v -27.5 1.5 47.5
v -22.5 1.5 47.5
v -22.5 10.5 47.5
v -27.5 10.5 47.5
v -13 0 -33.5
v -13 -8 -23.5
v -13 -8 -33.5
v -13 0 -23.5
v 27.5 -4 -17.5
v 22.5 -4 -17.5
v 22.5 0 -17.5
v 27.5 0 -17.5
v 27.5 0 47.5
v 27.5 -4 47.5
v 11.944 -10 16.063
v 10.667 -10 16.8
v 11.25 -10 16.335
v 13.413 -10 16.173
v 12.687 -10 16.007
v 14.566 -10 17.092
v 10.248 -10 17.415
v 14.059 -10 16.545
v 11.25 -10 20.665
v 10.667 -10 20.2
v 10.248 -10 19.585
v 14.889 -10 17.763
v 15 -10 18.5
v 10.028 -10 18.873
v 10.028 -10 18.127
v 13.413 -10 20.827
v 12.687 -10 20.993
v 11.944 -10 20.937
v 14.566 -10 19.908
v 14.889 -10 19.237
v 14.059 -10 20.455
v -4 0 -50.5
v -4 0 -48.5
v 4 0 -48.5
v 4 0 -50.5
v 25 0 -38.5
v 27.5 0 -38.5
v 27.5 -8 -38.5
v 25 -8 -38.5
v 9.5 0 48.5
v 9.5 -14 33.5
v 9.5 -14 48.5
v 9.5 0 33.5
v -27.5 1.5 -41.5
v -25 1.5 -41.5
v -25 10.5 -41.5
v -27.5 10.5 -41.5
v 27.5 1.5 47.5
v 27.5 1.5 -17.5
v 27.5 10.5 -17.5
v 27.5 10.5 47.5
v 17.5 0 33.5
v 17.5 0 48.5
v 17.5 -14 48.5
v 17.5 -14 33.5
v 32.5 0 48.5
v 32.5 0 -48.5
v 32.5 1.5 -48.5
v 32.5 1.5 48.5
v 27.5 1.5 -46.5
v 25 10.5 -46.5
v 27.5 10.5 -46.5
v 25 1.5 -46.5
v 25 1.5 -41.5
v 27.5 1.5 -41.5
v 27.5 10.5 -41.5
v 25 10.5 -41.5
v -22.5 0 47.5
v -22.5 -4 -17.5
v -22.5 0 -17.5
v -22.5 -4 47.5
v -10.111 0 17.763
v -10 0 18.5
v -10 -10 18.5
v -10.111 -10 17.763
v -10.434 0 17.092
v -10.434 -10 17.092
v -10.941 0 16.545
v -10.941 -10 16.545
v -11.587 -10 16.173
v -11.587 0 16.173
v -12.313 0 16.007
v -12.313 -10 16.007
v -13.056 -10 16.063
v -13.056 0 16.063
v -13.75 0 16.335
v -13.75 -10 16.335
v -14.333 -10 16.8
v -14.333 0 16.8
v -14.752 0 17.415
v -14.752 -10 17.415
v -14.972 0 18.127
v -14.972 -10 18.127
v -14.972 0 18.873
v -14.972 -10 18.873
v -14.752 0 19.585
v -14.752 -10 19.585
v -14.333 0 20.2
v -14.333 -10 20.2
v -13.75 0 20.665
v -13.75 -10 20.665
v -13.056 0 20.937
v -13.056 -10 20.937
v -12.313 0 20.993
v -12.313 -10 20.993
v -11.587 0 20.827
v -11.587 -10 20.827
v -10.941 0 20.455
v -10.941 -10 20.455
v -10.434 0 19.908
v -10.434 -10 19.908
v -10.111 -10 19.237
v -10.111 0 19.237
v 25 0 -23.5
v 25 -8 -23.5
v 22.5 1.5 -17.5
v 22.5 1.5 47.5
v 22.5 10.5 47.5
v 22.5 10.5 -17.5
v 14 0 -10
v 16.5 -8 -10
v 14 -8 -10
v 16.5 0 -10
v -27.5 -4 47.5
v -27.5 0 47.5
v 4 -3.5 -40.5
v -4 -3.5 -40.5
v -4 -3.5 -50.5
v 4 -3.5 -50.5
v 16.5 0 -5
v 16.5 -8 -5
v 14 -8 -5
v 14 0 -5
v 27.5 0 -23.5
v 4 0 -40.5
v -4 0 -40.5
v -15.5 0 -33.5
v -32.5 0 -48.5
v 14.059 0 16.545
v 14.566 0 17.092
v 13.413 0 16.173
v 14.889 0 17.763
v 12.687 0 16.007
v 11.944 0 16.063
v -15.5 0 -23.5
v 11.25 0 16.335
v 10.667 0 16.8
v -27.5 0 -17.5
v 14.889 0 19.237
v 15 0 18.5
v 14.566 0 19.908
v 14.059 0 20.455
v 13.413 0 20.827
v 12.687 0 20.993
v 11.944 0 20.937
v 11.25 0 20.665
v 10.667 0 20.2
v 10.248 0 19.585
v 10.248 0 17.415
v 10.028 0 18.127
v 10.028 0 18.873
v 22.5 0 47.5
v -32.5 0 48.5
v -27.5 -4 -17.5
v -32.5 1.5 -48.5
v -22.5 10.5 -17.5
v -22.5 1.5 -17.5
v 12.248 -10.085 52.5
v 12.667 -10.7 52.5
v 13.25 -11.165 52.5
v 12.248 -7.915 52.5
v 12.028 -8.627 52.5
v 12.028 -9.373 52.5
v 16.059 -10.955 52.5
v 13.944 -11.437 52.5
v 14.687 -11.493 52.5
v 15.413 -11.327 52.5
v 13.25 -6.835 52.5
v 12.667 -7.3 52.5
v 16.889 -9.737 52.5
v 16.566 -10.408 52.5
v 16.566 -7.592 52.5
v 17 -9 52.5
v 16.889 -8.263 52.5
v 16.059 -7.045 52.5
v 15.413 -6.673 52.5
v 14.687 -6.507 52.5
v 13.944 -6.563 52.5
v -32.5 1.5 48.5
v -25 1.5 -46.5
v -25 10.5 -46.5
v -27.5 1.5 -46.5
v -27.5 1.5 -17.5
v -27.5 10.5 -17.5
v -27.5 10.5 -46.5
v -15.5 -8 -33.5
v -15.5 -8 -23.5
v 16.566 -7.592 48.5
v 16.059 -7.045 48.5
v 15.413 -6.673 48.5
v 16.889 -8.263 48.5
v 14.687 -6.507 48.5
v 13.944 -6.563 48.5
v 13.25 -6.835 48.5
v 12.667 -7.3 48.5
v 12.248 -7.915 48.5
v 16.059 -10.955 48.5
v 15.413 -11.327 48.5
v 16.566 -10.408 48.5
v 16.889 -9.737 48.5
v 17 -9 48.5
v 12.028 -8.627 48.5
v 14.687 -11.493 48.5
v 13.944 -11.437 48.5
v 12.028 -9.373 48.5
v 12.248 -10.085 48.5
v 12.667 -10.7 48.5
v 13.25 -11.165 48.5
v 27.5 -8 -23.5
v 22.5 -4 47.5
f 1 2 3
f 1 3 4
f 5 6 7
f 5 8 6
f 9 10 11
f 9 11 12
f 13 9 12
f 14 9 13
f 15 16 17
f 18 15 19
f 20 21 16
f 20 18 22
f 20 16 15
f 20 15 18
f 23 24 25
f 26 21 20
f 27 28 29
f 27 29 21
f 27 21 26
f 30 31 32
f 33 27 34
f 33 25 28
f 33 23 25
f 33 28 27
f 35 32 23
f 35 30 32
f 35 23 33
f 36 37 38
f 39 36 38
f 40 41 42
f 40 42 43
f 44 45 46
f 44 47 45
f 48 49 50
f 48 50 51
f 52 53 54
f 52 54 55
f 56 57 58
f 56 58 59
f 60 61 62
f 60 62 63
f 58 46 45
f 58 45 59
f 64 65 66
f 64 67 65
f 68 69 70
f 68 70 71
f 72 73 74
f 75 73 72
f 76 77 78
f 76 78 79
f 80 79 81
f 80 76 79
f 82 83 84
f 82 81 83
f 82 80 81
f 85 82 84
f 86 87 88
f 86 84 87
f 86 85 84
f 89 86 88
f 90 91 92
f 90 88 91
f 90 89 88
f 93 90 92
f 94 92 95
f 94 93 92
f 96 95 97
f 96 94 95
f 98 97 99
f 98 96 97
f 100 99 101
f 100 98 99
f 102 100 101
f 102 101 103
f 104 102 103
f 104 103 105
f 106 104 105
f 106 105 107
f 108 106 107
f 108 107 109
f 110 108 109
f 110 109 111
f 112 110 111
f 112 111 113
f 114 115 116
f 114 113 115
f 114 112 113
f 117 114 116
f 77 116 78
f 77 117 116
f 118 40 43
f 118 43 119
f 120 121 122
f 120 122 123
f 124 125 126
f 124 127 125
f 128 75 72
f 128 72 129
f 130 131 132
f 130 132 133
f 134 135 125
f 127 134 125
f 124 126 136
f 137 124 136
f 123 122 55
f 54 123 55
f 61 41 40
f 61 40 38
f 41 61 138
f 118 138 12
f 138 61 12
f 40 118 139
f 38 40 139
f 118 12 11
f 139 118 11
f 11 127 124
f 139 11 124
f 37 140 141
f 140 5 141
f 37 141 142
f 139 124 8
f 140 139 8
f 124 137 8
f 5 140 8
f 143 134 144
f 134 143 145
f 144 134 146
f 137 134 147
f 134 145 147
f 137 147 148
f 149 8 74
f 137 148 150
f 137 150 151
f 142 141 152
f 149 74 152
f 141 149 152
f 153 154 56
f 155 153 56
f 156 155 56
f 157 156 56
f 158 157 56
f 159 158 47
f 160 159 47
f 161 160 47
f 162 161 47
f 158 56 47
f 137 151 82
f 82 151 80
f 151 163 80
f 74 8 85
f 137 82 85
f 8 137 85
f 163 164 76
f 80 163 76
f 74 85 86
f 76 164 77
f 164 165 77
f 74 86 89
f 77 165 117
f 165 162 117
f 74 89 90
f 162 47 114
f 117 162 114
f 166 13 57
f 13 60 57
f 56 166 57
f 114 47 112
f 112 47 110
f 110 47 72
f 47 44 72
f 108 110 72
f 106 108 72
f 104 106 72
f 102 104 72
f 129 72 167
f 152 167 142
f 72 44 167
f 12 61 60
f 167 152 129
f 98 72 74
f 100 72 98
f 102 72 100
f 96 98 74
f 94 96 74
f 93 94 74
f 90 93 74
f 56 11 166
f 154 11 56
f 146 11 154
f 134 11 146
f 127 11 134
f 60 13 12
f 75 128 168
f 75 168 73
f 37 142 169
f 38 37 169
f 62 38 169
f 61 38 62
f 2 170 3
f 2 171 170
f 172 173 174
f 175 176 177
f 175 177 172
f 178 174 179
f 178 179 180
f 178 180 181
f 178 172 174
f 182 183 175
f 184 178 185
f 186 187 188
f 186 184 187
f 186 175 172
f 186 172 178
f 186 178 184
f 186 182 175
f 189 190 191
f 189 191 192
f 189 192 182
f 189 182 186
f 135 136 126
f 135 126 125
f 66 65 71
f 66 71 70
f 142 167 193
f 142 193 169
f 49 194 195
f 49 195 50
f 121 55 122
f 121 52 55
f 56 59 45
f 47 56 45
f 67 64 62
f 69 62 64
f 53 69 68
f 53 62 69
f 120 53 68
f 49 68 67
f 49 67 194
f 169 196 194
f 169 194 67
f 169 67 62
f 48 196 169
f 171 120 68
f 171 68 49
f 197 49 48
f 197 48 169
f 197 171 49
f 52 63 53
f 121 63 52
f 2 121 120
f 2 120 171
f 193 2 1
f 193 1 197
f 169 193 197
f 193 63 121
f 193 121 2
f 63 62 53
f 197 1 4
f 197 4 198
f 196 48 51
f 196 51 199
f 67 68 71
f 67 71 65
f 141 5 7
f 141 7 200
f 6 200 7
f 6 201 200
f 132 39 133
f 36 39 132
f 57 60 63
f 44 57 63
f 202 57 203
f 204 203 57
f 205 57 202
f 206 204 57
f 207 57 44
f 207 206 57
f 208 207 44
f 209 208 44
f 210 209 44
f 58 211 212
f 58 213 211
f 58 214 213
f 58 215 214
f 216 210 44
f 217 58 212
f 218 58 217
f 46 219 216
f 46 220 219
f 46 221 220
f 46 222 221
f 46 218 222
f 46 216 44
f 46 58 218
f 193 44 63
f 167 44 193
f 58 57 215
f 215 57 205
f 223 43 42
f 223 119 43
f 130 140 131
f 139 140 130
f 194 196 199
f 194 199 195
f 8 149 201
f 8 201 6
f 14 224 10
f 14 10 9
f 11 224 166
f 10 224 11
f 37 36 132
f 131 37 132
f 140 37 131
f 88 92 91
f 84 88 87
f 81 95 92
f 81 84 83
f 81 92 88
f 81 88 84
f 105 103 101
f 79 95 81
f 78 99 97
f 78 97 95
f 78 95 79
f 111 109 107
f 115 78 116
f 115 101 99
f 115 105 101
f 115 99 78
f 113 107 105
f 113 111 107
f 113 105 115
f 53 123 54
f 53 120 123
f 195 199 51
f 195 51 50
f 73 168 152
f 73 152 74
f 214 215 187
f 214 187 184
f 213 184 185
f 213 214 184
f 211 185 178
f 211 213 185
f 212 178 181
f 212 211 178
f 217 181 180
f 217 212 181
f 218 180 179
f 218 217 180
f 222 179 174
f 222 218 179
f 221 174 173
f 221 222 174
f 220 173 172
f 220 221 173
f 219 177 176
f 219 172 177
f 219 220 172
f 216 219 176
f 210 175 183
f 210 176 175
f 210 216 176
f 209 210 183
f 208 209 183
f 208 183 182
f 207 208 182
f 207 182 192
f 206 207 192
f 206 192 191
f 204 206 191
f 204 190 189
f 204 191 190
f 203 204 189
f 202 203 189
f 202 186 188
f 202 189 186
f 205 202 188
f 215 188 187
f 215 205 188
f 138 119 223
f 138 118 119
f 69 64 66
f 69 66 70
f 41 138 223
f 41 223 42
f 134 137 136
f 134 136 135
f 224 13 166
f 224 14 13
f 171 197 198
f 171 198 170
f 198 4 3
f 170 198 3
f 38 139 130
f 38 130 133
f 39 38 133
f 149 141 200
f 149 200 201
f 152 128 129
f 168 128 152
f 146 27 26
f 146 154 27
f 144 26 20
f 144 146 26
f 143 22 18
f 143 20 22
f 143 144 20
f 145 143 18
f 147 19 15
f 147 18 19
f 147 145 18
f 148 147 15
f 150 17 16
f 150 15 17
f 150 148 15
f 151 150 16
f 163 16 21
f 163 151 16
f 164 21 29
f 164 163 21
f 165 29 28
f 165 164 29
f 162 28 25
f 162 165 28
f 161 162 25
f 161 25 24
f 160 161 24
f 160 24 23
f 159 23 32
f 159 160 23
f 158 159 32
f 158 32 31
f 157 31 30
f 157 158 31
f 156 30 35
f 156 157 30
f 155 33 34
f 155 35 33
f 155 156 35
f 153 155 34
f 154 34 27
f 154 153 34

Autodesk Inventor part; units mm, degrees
ref_plane "YZ Plane" through (0, 0, 0) normal (1, 0, 0) x (0, 1, 0)
ref_plane "XZ Plane" through (0, 0, 0) normal (0, 1, 0) x (-1, 0, 0)
ref_plane "XY Plane" through (0, 0, 0) normal (0, 0, 1) x (1, 0, 0)
sketch "Esquisse1" plane through (0, 0, 0) normal (0, 1, 0) x (-1, 0, 0)
  line L0 (-32.5, 48.5) -> (32.5, 48.5)
  line L1 (32.5, 48.5) -> (32.5, -48.5)
  line L2 (32.5, -48.5) -> (-32.5, -48.5)
  line L3 (-32.5, -48.5) -> (-32.5, 48.5)
  point P0 (0, 0)
  dimension "d0" = 65
  dimension "d1" = 97
  dimension "d2" = 32.5
  dimension "d3" = 48.5
extrude "Extrusion1" add sketch "Esquisse1" along normal blind 1.5
sketch "Esquisse2" plane through (0, 1.5, 0) normal (0, 1, 0) x (1, 0, 0)
  line L0 (-32.5, -48.5) -> (32.5, -48.5) projected
  line L1 (32.5, -48.5) -> (32.5, 48.5) projected
  line L2 (-32.5, 48.5) -> (-32.5, -48.5) projected
  line L3 (-27.5, 17.5) -> (-22.5, 17.5)
  line L4 (-22.5, 17.5) -> (-22.5, -47.5)
  line L5 (-22.5, -47.5) -> (-27.5, -47.5)
  line L6 (-27.5, -47.5) -> (-27.5, 17.5)
  line L7 (22.5, 17.5) -> (27.5, 17.5)
  line L8 (27.5, 17.5) -> (27.5, -47.5)
  line L9 (27.5, -47.5) -> (22.5, -47.5)
  line L10 (22.5, -47.5) -> (22.5, 17.5)
  point P0 (0, 0)
  dimension "d6" = 5
  dimension "d7" = 5
  dimension "d8" = 65
  dimension "d9" = 5
  dimension "d10" = 5
  dimension "d11" = 1
extrude "Extrusion2" add sketch "Esquisse2" along normal blind 9 and the other way blind 5.5
sketch "Esquisse3" plane through (0, 0, 0) normal (0, -1, 0) x (1, 0, 0)
  line L0 (32.5, 48.5) -> (-32.5, 48.5) projected
  line L1 (32.5, -48.5) -> (32.5, 48.5) projected
  line L2 (9.5, 48.5) -> (17.5, 48.5)
  line L3 (17.5, 48.5) -> (17.5, 33.5)
  line L4 (17.5, 33.5) -> (9.5, 33.5)
  line L5 (9.5, 33.5) -> (9.5, 48.5)
  point P0 (0, 0)
  dimension "d16" = 15
  dimension "d17" = 8
  dimension "d18" = 15
extrude "Extrusion3" add sketch "Esquisse3" along normal blind 14
sketch "Esquisse4" plane through (-32.5, 1.5, 48.5) normal (0, 0, 1) x (1, 0, 0)
  line L0 (50, -15.5) -> (42, -15.5) projected
  line L1 (50, -1.5) -> (50, -15.5) projected
  circle A0 centre (47, -10.5) radius 2.5
  point P0 (32.5, -1.5)
  dimension "d21" = 5
  dimension "d22" = 5
  dimension "d23" = 3
extrude "Extrusion4" add sketch "Esquisse4" along normal blind 4
sketch "Esquisse5" plane through (0, 0, 0) normal (0, -1, 0) x (1, 0, 0)
  line L0 (9.5, 48.5) -> (-32.5, 48.5) projected
  line L1 (-32.5, 48.5) -> (-32.5, -48.5) projected
  line L2 (32.5, -48.5) -> (32.5, 48.5) projected
  line L3 (32.5, 48.5) -> (17.5, 48.5) projected
  circle A0 centre (-12.5, 18.5) radius 2.5
  circle A1 centre (12.5, 18.5) radius 2.5
  point P0 (0, 0)
  dimension "d26" = 30
  dimension "d27" = 30
  dimension "d28" = 25
  dimension "d29" = 20
  dimension "d30" = 65
  dimension "d31" = 5
  dimension "d32" = 5
extrude "Extrusion5" add sketch "Esquisse5" along normal blind 10
sketch "Esquisse6" plane through (0, 0, 0) normal (0, -1, 0) x (1, 0, 0)
  line L0 (-32.5, 48.5) -> (-32.5, -48.5) projected
  line L1 (-32.5, -48.5) -> (32.5, -48.5) projected
  line L2 (32.5, -48.5) -> (32.5, 48.5) projected
  line L3 (27.5, -17.5) -> (22.5, -17.5) projected
  line L4 (22.5, -17.5) -> (22.5, 47.5) projected
  line L5 (25, -23.5) -> (27.5, -23.5)
  line L6 (27.5, -23.5) -> (27.5, -38.5)
  line L7 (27.5, -38.5) -> (25, -38.5)
  line L8 (25, -38.5) -> (25, -23.5)
  line L9 (-15.5, -23.5) -> (-13, -23.5)
  line L10 (-13, -23.5) -> (-13, -33.5)
  line L11 (-13, -33.5) -> (-15.5, -33.5)
  line L12 (-15.5, -33.5) -> (-15.5, -23.5)
  line L13 (14, -5) -> (16.5, -5)
  line L14 (16.5, -5) -> (16.5, -10)
  line L15 (16.5, -10) -> (14, -10)
  line L16 (14, -10) -> (14, -5)
  point P0 (0, 0)
  dimension "d35" = 2.5
  dimension "d36" = 2.5
  dimension "d37" = 2.5
  dimension "d38" = 10
  dimension "d39" = 5
  dimension "d40" = 15
  dimension "d41" = 5
  dimension "d42" = 17
  dimension "d43" = 6
  dimension "d44" = 10
  dimension "d45" = 15
  dimension "d46" = 7.5
extrude "Extrusion6" add sketch "Esquisse6" along normal blind 8
sketch "Esquisse7" plane through (0, 0, 0) normal (0, -1, 0) x (1, 0, 0)
  line L0 (-32.5, 48.5) -> (-32.5, -48.5) projected
  line L1 (-32.5, -48.5) -> (32.5, -48.5) projected
  line L2 (-4, -40.5) -> (4, -40.5)
  line L3 (4, -40.5) -> (4, -50.5)
  line L4 (4, -50.5) -> (-4, -50.5)
  line L5 (-4, -50.5) -> (-4, -40.5)
  point P0 (0, 0)
  dimension "d49" = 10
  dimension "d50" = 8
  dimension "d51" = 65
  dimension "d52" = 28.5
  dimension "d53" = 2
extrude "Extrusion7" add sketch "Esquisse7" along normal blind 3.5
sketch "Esquisse8" plane through (0, 1.5, 0) normal (0, 1, 0) x (1, 0, 0)
  line L0 (32.5, -48.5) -> (32.5, 48.5) projected
  line L1 (32.5, 48.5) -> (-32.5, 48.5) projected
  line L2 (-32.5, 48.5) -> (-32.5, -48.5) projected
  line L3 (-27.5, 46.5) -> (-25, 46.5)
  line L4 (-25, 46.5) -> (-25, 41.5)
  line L5 (-25, 41.5) -> (-27.5, 41.5)
  line L6 (-27.5, 41.5) -> (-27.5, 46.5)
  line L7 (25, 46.5) -> (27.5, 46.5)
  line L8 (27.5, 46.5) -> (27.5, 41.5)
  line L9 (27.5, 41.5) -> (25, 41.5)
  line L10 (25, 41.5) -> (25, 46.5)
  point P0 (0, 0)
  dimension "d56" = 2.5
  dimension "d57" = 2.5
  dimension "d58" = 5
  dimension "d59" = 5
  dimension "d60" = 2
  dimension "d61" = 2
  dimension "d62" = 5
  dimension "d63" = 5
extrude "Extrusion8" add sketch "Esquisse8" along normal blind 9
equation "\"d2\" = 0.5 * d0"
equation "\"d3\" = 0.5 * d1"
equation "\"d7\" = d6"
equation "\"d9\" = d6"
equation "\"d10\" = d9"
equation "\"d27\" = d26"
equation "\"d29\" = -0.5 * d28 + 0.5 * d30"
equation "\"d32\" = d31"
equation "\"d52\" = -0.5 * d50 + 0.5 * d51"
equation "\"d57\" = d56"
equation "\"d61\" = d60"
equation "\"d63\" = d62"
properties part number "discovery"
